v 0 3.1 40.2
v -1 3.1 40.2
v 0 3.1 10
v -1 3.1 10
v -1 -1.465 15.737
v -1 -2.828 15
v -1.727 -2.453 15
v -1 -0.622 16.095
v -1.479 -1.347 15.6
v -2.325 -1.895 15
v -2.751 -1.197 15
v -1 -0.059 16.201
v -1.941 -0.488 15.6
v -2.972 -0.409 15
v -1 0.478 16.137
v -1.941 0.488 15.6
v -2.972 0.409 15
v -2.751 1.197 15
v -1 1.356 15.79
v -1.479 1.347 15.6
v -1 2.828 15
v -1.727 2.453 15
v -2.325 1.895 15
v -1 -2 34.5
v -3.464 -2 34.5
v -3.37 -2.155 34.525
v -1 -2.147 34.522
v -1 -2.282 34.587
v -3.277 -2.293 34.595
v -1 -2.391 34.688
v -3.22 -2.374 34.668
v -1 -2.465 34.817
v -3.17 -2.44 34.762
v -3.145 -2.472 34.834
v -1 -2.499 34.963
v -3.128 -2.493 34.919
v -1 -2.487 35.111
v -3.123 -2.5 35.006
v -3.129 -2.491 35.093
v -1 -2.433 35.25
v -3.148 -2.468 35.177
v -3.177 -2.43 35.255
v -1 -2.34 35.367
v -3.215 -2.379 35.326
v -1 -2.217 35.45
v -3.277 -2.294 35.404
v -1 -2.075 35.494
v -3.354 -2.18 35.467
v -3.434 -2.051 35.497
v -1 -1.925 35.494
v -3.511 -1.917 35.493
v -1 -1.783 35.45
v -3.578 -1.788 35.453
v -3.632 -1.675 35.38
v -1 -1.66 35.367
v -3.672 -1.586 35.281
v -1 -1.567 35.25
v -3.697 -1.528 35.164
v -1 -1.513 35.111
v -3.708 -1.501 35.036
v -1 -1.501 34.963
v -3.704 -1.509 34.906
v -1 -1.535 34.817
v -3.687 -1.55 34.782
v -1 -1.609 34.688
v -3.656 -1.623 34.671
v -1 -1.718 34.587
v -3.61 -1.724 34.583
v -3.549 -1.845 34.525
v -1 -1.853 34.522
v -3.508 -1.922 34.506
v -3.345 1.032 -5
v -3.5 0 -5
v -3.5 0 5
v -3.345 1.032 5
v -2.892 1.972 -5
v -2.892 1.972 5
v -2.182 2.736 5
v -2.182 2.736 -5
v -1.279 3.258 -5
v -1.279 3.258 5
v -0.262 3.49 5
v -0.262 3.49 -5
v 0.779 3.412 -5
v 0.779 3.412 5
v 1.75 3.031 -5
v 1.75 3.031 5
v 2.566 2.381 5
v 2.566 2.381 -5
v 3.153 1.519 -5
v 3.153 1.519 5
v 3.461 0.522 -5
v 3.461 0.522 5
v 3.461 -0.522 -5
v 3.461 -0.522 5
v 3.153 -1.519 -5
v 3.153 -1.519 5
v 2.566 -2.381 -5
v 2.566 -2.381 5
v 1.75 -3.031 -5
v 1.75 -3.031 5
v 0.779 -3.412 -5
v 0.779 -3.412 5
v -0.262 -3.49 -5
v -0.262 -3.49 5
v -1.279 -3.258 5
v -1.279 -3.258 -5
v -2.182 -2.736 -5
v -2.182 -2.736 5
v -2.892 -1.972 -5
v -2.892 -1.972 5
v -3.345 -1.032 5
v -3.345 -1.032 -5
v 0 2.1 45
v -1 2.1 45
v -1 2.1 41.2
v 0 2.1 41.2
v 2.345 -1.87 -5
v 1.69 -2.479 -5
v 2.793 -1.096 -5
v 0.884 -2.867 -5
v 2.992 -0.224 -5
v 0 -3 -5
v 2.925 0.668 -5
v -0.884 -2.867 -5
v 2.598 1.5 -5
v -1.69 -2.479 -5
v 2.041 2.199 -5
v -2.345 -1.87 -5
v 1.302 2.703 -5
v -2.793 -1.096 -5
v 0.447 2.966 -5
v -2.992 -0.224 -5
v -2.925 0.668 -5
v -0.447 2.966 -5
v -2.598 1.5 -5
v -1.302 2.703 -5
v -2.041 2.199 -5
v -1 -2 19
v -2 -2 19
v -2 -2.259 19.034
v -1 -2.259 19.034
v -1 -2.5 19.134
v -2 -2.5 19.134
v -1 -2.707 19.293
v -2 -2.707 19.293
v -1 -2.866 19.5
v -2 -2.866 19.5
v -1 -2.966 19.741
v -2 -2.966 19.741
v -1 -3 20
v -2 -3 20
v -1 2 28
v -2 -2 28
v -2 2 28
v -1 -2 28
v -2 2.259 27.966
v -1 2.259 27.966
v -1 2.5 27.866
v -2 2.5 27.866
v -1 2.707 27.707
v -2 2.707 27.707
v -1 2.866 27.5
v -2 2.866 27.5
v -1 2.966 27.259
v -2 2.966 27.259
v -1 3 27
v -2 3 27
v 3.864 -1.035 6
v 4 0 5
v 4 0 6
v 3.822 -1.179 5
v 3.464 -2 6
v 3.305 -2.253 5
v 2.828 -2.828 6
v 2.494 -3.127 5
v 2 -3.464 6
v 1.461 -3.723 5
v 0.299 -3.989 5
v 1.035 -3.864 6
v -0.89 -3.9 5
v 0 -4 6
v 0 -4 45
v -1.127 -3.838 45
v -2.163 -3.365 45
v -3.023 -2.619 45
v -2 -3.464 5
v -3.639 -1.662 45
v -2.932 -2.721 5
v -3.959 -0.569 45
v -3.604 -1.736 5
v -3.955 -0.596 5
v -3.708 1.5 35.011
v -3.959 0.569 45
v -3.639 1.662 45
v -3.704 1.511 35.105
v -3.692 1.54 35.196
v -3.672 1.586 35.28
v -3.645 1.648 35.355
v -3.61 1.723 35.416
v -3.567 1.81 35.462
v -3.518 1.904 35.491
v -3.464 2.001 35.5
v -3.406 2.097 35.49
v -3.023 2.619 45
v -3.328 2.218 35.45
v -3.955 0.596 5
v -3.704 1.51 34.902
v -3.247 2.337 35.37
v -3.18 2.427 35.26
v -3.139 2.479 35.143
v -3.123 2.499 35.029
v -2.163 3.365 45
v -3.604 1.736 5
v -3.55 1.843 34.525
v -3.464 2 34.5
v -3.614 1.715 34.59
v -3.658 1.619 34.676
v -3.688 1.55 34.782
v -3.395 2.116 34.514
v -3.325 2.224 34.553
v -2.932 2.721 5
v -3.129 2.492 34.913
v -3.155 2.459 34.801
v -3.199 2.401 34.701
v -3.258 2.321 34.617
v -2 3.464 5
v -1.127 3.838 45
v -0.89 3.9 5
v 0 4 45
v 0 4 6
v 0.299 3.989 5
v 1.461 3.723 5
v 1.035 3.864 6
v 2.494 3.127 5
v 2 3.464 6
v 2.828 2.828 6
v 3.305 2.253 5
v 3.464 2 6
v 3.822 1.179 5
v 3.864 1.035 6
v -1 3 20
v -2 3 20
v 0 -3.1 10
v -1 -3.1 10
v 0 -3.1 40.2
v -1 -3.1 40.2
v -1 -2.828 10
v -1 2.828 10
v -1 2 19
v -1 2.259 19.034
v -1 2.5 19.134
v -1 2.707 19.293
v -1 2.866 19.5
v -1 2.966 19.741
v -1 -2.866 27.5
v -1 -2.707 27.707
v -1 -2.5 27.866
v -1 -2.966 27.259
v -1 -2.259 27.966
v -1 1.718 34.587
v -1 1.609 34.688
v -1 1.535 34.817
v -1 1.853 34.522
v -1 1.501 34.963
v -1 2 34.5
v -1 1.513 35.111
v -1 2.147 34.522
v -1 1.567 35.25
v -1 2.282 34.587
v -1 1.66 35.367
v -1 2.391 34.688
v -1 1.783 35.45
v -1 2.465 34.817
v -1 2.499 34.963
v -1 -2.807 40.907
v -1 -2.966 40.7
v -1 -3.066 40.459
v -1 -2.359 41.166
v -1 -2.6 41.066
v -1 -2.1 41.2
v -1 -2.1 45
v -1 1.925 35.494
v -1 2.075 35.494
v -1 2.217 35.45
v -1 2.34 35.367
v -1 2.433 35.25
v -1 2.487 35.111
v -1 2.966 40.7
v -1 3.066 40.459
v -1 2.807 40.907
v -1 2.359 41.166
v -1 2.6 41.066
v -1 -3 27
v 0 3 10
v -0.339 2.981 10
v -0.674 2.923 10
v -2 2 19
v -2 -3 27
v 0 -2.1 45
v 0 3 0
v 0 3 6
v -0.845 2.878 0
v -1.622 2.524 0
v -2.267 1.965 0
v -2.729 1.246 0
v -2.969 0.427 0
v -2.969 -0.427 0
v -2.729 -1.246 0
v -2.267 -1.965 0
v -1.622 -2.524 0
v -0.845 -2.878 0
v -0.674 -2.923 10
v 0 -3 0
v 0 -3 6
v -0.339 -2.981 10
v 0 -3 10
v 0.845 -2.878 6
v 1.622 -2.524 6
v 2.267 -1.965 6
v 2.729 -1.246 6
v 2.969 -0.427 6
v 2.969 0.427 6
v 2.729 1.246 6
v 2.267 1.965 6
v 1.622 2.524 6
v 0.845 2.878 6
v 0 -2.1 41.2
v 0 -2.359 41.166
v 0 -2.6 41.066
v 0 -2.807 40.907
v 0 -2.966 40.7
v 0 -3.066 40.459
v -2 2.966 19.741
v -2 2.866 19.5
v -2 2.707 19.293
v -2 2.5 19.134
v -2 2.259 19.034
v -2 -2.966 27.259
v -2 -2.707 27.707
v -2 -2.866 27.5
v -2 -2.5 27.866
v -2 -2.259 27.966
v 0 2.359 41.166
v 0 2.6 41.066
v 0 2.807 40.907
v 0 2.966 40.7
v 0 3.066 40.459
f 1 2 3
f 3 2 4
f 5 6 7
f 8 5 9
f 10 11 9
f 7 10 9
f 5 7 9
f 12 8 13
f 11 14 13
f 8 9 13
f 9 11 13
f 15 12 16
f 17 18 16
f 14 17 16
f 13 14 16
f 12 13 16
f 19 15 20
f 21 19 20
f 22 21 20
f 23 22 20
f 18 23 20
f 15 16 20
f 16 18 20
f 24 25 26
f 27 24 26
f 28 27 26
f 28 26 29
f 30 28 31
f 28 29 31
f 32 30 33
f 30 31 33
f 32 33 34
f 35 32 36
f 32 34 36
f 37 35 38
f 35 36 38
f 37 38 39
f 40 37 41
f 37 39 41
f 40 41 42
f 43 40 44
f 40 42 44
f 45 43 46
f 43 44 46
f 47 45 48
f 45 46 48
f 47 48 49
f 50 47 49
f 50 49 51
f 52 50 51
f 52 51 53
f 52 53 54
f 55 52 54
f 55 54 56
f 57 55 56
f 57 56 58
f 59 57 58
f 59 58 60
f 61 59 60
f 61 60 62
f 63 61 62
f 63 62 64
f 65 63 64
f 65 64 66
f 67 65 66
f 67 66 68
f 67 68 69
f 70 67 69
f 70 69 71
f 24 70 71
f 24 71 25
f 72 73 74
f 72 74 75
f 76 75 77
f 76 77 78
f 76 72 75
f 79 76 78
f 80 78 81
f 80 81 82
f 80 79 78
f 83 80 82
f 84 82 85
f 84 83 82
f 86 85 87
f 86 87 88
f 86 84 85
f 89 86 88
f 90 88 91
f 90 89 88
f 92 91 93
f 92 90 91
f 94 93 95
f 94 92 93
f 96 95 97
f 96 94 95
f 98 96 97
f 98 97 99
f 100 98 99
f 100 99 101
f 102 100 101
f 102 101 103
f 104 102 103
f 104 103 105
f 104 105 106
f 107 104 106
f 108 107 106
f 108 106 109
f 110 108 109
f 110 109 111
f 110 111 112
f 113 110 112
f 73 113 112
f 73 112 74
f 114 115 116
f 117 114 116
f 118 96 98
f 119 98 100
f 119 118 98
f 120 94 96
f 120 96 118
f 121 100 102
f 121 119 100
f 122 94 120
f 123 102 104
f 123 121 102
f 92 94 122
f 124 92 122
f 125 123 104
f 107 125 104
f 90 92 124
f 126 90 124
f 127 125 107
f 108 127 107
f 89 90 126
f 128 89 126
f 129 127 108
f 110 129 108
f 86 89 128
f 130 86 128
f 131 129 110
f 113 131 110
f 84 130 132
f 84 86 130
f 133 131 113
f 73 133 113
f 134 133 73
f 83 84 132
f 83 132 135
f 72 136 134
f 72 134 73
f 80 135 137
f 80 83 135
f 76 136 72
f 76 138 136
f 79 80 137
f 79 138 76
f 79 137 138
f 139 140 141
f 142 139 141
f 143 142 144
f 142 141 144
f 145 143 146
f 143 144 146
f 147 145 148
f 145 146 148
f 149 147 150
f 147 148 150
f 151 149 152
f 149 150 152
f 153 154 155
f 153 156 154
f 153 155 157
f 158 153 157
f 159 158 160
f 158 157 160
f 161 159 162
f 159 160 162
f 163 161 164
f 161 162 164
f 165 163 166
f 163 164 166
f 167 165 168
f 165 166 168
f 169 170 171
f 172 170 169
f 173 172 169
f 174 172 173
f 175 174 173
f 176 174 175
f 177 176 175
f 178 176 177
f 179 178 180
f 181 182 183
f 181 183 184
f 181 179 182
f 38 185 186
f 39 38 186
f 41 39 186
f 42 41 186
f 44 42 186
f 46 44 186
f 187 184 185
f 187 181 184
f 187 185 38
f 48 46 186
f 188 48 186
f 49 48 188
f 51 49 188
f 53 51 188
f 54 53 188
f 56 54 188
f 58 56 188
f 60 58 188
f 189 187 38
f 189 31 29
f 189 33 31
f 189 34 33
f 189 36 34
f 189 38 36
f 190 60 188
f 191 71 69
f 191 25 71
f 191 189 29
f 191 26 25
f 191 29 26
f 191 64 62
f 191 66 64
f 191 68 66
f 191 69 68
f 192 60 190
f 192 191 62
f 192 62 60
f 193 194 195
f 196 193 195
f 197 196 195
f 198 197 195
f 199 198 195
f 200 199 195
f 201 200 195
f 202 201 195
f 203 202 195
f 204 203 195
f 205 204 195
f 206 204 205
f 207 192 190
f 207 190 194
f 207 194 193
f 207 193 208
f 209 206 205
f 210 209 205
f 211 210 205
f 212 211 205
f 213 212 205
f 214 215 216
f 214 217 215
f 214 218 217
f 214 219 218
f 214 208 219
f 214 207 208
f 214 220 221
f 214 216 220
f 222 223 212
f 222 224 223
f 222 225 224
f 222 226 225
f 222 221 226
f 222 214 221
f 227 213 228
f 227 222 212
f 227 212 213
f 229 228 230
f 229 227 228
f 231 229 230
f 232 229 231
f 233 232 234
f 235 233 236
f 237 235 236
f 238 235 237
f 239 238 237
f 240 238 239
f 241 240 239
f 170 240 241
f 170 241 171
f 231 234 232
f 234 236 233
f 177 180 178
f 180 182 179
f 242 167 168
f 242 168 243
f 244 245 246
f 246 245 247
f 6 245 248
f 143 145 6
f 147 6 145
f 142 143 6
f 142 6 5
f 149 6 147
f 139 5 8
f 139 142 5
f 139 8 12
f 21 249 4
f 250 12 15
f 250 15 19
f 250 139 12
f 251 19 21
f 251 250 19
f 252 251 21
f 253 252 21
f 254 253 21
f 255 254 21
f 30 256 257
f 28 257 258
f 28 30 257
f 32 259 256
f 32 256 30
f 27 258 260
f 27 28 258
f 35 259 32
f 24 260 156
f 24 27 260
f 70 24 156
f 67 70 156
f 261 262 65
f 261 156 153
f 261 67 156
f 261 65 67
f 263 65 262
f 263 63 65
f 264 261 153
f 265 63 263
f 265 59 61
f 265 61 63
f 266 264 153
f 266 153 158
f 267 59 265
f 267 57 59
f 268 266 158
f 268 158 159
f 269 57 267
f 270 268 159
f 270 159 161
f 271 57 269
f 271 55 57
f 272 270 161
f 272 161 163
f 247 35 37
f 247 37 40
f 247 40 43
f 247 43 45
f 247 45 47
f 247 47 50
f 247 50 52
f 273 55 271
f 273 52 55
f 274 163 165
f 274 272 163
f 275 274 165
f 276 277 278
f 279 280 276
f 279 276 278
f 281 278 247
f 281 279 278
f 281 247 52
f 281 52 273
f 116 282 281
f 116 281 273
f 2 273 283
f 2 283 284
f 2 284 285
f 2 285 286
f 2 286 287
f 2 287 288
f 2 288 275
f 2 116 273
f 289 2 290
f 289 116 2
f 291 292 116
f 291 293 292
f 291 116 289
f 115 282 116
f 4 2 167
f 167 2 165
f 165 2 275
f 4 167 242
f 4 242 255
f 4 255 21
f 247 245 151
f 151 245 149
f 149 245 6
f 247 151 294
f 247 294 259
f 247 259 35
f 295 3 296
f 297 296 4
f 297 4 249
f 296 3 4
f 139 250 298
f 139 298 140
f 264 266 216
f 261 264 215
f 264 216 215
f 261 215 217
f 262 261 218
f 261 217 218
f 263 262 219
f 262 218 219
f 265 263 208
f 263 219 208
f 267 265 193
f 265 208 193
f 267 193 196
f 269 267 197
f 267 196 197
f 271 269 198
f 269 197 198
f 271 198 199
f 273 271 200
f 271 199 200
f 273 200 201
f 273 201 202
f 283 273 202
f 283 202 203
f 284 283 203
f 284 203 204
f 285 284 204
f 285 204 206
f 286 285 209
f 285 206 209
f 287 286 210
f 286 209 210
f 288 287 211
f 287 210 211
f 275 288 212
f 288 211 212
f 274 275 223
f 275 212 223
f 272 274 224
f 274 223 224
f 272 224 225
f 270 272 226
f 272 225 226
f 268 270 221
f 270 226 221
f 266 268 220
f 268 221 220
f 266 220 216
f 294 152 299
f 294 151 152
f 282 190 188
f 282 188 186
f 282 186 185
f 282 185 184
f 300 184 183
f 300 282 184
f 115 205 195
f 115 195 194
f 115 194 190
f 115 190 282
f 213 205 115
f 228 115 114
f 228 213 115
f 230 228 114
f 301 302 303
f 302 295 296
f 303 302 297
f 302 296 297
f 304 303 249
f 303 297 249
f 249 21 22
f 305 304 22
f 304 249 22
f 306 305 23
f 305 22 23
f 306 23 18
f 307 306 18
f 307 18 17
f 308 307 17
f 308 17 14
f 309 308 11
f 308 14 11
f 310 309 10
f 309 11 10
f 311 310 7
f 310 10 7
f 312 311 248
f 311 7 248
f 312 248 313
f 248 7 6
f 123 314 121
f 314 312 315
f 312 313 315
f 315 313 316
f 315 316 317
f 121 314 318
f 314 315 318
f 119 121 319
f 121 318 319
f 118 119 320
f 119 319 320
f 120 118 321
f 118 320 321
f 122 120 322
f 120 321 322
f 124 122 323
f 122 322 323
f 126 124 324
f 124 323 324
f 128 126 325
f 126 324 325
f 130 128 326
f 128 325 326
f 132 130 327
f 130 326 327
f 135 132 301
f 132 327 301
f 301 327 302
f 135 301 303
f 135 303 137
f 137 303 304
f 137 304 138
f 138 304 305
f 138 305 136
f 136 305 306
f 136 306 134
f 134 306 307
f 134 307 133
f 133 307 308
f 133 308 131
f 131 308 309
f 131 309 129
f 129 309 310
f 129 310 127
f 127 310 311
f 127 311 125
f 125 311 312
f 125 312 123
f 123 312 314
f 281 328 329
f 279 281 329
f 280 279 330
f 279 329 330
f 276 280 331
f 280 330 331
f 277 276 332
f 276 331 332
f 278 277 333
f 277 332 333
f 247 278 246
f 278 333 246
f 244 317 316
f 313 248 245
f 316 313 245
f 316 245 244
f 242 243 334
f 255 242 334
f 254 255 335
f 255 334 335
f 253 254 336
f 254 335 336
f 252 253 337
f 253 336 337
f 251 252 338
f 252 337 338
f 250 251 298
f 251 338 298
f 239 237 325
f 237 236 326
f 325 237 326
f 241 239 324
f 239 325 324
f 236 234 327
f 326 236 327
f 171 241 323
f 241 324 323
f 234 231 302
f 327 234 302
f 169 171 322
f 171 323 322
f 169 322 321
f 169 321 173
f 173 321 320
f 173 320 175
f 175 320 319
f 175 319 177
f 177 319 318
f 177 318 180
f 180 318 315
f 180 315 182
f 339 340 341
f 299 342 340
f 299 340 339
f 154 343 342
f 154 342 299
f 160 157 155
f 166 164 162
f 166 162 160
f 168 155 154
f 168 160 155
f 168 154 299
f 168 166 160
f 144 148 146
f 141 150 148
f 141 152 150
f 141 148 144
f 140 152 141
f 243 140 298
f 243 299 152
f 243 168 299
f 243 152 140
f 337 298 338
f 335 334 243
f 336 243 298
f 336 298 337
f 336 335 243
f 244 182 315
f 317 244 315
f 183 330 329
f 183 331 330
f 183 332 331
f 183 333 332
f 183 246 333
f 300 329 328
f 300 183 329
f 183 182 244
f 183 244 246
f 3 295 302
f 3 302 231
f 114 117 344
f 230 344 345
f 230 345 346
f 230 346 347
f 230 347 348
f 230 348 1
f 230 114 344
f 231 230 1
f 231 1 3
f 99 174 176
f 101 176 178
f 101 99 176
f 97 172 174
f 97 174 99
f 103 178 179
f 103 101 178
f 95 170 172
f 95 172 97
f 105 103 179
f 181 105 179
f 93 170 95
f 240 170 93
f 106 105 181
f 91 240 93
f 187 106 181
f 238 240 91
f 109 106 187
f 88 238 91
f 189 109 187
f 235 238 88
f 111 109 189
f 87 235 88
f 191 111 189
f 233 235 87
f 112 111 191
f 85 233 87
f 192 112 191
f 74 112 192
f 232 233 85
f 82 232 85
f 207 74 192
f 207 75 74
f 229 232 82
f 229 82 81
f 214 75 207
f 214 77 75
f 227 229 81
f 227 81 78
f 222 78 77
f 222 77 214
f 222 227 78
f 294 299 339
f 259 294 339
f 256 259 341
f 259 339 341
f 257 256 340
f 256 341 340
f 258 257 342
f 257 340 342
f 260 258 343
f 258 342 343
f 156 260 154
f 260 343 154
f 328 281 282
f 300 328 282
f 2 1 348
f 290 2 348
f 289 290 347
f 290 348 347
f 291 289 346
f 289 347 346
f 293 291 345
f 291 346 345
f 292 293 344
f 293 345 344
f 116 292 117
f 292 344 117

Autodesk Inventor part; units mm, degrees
ref_plane "XZ Plane" through (0, 0, 0) normal (0, 1, 0) x (-1, 0, 0)
ref_plane "XY Plane" through (0, 0, 0) normal (0, 0, 1) x (1, 0, 0)
sketch "Skizze1" plane through (0, 0, 0) normal (0, 0, 1) x (1, 0, 0)
  circle A0 centre (0, 0) radius 4
  dimension "d0" = 8
extrude "Extrusion1" add sketch "Skizze1" along normal blind 45
ref_plane "Mittelebene" through (0, 0, 0) normal (1, 0, 0) x (0, 1, 0)
ref_plane "Mittelebene - PCB-Dicke" through (-1, 0, 0) normal (1, 0, 0) x (0, 1, 0)
sketch "Skizze8" plane through (0, 0, 0) normal (1, 0, 0) x (0, 1, 0)
  line L0 (-4, 45) -> (4, 45)
  line L1 (4, 45) -> (4, 6)
  line L2 (4, 6) -> (-4, 6)
  line L3 (-4, 6) -> (-4, 45)
  point P0 (0, 0)
  dimension "d100" = 8
  dimension "d101" = 39
extrude "Extrusion6" cut sketch "Skizze8" along normal blind 14.5
sketch "Skizze12" plane through (-1, 0, 0) normal (1, 0, 0) x (0, 1, 0)
  line L0 (2.1, 10) -> (-2.1, 10)
  line L1 (-2.1, 10) -> (-2.1, 45)
  line L2 (-2.1, 45) -> (2.1, 45)
  line L3 (2.1, 45) -> (2.1, 10)
  point P0 (0, 0)
  dimension "d103" = 4.2
  dimension "d104" = 35
extrude "Extrusion8" cut sketch "Skizze12" along normal blind 6.75
sketch "Skizze13" plane through (-1, 0, 0) normal (1, 0, 0) x (0, 1, 0)
  line L0 (3.1, 10) -> (-3.1, 10)
  line L1 (-3.1, 10) -> (-3.1, 41.2)
  line L2 (-3.1, 41.2) -> (3.1, 41.2)
  line L3 (3.1, 41.2) -> (3.1, 10)
  point P0 (0, 0)
  dimension "d105" = 6.2
  dimension "d106" = 31.2
extrude "Extrusion9" cut sketch "Skizze13" along normal blind 6.25
sketch "Skizze14" plane through (-1, 0, 0) normal (1, 0, 0) x (0, 1, 0)
  point P0 (0, 0)
  point P1 (-2, 35)
  point P2 (2, 35)
hole "Bohrung3" at (-1, -2, 35) at (-1, 2, 35) direction (-1, 0, 0) diameter 1 end through all
thread "Gewinde5" size "M1x0.25" class "6H" standard "ANSI Metric M Profile" full length
thread "Gewinde6" size "M1x0.25" class "6H" standard "ANSI Metric M Profile" full length
sketch "Skizze15" plane through (0, 0, 0) normal (0, 0, -1) x (-1, 0, 0)
  circle A0 centre (0, 0) radius 4
  dimension "d78" = 8
extrude "Extrusion12" add sketch "Skizze15" along normal blind 5
hole "Bohrung5" at (0, 0, 0) direction (0, 0, -1) diameter 6 end through all
hole "Bohrung6" at (0, 0, 0) direction (0, 0, 1) diameter 6 depth 15 tip angle 118
sketch "Skizze16" plane through (0, 0, -5) normal (0, 0, -1) x (-1, 0, 0)
  circle A0 centre (0, 0) radius 4 projected
  circle A1 centre (0, 0) radius 3.5
  dimension "d95" = 7
extrude "Extrusion13" cut sketch "Skizze16" against normal blind 10
thread "Gewinde7" size "M7x0.5" class "6g" standard "ANSI Metric M Profile" length 10
fillet "Rundung1" radius 1 1 edges at (-0.5, -3.1, 41.2)
fillet "Rundung2" radius 1 1 edges at (-0.5, 3.1, 41.2)
sketch "Skizze17" plane through (-1, 0, 0) normal (1, 0, 0) x (0, 0, -1)
  line L0 (-19, -3) -> (-28, -3)
  line L1 (-28, -3) -> (-28, 3)
  line L2 (-28, 3) -> (-19, 3)
  line L3 (-19, 3) -> (-19, -3)
  point P0 (0, 0)
  dimension "d114" = 9
  dimension "d115" = 6
extrude "Extrusion14" cut sketch "Skizze17" against normal blind 1
fillet "Rundung6" radius 1 4 edges at (-1.5, -3, 19) (-1.5, 3, 19) (-1.5, 3, 28) (-1.5, -3, 28)
properties part number "PEEK-PCB-holder" material "Polyaryletherketon-Kunststoff"
